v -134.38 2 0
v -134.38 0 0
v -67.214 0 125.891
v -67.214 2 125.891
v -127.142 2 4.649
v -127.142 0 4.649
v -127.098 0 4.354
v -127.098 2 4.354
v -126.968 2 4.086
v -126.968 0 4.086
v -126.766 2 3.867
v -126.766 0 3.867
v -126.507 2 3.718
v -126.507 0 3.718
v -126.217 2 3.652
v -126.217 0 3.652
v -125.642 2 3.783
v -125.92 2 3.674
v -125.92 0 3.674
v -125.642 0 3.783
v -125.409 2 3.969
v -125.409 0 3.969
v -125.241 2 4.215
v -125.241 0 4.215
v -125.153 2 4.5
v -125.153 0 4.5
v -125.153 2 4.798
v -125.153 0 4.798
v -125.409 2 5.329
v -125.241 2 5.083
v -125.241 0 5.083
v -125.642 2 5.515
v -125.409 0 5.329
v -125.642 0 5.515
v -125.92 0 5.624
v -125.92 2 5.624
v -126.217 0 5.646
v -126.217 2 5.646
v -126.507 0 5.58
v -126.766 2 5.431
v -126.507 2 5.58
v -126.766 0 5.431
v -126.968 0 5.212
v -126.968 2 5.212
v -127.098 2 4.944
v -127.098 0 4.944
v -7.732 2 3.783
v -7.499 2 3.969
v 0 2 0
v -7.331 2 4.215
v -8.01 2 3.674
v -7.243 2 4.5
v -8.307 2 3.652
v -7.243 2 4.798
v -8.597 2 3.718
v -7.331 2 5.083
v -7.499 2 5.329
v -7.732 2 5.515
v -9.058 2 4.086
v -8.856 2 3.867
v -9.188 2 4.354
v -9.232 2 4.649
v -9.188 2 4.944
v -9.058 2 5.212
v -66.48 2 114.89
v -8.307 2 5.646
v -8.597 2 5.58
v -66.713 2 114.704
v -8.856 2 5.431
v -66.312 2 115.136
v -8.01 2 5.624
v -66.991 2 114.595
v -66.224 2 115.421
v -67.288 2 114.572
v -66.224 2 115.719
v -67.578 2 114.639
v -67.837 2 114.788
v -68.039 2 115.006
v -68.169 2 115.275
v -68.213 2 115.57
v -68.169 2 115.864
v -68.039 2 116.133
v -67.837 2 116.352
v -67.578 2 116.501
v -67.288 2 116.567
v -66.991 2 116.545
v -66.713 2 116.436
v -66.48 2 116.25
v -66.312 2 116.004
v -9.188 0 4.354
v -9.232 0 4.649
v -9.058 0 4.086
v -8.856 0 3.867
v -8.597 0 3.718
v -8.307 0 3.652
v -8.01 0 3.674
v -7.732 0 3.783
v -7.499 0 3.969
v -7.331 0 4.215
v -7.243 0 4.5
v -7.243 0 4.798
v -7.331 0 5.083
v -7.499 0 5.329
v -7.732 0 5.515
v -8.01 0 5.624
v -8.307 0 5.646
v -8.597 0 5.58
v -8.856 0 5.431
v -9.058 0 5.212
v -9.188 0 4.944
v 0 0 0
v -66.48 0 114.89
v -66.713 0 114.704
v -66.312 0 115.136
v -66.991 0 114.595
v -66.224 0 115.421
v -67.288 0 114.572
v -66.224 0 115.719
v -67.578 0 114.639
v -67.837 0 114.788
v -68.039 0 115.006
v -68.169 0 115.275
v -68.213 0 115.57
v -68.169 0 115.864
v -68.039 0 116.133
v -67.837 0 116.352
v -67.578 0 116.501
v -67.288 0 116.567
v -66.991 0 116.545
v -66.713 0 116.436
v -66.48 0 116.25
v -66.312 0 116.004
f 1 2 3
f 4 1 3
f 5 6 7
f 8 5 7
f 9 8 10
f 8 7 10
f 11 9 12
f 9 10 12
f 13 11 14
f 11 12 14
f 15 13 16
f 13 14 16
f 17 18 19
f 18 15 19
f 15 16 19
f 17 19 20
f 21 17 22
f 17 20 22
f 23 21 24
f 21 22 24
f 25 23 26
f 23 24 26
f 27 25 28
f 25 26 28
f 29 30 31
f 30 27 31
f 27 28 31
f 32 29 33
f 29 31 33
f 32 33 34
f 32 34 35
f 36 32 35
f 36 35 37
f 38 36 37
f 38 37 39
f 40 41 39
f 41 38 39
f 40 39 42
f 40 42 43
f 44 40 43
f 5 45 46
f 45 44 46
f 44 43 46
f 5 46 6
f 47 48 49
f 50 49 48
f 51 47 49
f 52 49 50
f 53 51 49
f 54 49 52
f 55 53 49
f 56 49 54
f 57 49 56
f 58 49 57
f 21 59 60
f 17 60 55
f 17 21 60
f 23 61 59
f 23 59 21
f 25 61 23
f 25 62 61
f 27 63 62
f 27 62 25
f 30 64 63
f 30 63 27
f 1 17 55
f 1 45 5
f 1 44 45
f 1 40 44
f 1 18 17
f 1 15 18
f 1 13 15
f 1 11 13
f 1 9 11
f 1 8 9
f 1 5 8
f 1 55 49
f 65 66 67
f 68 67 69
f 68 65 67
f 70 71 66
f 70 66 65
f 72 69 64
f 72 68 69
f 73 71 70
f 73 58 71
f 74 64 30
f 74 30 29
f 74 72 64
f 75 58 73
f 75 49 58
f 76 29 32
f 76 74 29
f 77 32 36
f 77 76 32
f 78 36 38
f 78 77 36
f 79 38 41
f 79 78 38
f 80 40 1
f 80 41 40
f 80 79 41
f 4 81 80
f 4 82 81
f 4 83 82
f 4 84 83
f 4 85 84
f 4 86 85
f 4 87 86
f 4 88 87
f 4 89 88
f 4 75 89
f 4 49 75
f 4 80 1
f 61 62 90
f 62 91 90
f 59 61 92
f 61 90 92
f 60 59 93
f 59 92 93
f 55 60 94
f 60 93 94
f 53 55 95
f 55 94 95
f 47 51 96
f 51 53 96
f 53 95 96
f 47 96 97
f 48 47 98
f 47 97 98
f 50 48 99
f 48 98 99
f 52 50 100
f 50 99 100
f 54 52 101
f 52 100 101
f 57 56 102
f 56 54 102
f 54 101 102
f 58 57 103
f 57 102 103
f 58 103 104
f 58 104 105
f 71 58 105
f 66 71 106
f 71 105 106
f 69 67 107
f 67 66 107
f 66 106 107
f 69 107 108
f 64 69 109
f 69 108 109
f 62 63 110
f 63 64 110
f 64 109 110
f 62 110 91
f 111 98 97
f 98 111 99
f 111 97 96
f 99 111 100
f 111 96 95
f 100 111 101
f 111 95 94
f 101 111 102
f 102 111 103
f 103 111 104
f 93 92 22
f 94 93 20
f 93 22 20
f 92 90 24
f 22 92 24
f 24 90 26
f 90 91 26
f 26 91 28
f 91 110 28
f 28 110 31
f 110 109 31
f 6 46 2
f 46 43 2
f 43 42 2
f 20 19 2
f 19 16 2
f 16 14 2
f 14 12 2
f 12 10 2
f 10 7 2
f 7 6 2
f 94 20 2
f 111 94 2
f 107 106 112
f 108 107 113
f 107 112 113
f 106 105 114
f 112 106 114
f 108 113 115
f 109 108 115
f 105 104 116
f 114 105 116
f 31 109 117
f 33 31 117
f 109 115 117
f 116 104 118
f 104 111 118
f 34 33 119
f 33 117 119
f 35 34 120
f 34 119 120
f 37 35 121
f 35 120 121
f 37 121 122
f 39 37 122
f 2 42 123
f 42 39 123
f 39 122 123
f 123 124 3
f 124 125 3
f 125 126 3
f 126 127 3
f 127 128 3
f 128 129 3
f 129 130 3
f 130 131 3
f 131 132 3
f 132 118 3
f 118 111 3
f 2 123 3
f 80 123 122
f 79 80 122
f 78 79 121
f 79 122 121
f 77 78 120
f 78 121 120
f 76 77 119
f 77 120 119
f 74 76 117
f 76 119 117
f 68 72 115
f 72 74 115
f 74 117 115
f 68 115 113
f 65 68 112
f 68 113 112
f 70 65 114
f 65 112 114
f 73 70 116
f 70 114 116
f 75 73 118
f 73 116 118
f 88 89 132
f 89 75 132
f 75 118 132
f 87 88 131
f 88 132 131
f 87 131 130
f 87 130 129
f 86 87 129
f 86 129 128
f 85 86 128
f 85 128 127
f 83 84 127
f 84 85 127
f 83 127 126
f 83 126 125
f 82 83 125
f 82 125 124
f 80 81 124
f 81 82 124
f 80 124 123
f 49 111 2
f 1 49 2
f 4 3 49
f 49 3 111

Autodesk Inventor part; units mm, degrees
ref_plane "YZ Plane" through (0, 0, 0) normal (1, 0, 0) x (0, 1, 0)
ref_plane "XZ Plane" through (0, 0, 0) normal (0, 1, 0) x (-1, 0, 0)
ref_plane "XY Plane" through (0, 0, 0) normal (0, 0, 1) x (1, 0, 0)
sketch "Sketch1" plane through (0, 0, 0) normal (0, 1, 0) x (-1, 0, 0)
  line L0 (0, 0) -> (134.38, 0)
  line L1 (134.38, 0) -> (67.2135, 125.8908)
  line L2 (67.2135, 125.8908) -> (0, 0)
  circle A0 centre (8.2321, 4.6489) radius 1
  circle A1 centre (126.1421, 4.6489) radius 1
  circle A2 centre (67.2131, 115.5697) radius 1
extrude "Extrusion1" add sketch "Sketch1" along normal blind 2
properties part number "bcc_pcb"
